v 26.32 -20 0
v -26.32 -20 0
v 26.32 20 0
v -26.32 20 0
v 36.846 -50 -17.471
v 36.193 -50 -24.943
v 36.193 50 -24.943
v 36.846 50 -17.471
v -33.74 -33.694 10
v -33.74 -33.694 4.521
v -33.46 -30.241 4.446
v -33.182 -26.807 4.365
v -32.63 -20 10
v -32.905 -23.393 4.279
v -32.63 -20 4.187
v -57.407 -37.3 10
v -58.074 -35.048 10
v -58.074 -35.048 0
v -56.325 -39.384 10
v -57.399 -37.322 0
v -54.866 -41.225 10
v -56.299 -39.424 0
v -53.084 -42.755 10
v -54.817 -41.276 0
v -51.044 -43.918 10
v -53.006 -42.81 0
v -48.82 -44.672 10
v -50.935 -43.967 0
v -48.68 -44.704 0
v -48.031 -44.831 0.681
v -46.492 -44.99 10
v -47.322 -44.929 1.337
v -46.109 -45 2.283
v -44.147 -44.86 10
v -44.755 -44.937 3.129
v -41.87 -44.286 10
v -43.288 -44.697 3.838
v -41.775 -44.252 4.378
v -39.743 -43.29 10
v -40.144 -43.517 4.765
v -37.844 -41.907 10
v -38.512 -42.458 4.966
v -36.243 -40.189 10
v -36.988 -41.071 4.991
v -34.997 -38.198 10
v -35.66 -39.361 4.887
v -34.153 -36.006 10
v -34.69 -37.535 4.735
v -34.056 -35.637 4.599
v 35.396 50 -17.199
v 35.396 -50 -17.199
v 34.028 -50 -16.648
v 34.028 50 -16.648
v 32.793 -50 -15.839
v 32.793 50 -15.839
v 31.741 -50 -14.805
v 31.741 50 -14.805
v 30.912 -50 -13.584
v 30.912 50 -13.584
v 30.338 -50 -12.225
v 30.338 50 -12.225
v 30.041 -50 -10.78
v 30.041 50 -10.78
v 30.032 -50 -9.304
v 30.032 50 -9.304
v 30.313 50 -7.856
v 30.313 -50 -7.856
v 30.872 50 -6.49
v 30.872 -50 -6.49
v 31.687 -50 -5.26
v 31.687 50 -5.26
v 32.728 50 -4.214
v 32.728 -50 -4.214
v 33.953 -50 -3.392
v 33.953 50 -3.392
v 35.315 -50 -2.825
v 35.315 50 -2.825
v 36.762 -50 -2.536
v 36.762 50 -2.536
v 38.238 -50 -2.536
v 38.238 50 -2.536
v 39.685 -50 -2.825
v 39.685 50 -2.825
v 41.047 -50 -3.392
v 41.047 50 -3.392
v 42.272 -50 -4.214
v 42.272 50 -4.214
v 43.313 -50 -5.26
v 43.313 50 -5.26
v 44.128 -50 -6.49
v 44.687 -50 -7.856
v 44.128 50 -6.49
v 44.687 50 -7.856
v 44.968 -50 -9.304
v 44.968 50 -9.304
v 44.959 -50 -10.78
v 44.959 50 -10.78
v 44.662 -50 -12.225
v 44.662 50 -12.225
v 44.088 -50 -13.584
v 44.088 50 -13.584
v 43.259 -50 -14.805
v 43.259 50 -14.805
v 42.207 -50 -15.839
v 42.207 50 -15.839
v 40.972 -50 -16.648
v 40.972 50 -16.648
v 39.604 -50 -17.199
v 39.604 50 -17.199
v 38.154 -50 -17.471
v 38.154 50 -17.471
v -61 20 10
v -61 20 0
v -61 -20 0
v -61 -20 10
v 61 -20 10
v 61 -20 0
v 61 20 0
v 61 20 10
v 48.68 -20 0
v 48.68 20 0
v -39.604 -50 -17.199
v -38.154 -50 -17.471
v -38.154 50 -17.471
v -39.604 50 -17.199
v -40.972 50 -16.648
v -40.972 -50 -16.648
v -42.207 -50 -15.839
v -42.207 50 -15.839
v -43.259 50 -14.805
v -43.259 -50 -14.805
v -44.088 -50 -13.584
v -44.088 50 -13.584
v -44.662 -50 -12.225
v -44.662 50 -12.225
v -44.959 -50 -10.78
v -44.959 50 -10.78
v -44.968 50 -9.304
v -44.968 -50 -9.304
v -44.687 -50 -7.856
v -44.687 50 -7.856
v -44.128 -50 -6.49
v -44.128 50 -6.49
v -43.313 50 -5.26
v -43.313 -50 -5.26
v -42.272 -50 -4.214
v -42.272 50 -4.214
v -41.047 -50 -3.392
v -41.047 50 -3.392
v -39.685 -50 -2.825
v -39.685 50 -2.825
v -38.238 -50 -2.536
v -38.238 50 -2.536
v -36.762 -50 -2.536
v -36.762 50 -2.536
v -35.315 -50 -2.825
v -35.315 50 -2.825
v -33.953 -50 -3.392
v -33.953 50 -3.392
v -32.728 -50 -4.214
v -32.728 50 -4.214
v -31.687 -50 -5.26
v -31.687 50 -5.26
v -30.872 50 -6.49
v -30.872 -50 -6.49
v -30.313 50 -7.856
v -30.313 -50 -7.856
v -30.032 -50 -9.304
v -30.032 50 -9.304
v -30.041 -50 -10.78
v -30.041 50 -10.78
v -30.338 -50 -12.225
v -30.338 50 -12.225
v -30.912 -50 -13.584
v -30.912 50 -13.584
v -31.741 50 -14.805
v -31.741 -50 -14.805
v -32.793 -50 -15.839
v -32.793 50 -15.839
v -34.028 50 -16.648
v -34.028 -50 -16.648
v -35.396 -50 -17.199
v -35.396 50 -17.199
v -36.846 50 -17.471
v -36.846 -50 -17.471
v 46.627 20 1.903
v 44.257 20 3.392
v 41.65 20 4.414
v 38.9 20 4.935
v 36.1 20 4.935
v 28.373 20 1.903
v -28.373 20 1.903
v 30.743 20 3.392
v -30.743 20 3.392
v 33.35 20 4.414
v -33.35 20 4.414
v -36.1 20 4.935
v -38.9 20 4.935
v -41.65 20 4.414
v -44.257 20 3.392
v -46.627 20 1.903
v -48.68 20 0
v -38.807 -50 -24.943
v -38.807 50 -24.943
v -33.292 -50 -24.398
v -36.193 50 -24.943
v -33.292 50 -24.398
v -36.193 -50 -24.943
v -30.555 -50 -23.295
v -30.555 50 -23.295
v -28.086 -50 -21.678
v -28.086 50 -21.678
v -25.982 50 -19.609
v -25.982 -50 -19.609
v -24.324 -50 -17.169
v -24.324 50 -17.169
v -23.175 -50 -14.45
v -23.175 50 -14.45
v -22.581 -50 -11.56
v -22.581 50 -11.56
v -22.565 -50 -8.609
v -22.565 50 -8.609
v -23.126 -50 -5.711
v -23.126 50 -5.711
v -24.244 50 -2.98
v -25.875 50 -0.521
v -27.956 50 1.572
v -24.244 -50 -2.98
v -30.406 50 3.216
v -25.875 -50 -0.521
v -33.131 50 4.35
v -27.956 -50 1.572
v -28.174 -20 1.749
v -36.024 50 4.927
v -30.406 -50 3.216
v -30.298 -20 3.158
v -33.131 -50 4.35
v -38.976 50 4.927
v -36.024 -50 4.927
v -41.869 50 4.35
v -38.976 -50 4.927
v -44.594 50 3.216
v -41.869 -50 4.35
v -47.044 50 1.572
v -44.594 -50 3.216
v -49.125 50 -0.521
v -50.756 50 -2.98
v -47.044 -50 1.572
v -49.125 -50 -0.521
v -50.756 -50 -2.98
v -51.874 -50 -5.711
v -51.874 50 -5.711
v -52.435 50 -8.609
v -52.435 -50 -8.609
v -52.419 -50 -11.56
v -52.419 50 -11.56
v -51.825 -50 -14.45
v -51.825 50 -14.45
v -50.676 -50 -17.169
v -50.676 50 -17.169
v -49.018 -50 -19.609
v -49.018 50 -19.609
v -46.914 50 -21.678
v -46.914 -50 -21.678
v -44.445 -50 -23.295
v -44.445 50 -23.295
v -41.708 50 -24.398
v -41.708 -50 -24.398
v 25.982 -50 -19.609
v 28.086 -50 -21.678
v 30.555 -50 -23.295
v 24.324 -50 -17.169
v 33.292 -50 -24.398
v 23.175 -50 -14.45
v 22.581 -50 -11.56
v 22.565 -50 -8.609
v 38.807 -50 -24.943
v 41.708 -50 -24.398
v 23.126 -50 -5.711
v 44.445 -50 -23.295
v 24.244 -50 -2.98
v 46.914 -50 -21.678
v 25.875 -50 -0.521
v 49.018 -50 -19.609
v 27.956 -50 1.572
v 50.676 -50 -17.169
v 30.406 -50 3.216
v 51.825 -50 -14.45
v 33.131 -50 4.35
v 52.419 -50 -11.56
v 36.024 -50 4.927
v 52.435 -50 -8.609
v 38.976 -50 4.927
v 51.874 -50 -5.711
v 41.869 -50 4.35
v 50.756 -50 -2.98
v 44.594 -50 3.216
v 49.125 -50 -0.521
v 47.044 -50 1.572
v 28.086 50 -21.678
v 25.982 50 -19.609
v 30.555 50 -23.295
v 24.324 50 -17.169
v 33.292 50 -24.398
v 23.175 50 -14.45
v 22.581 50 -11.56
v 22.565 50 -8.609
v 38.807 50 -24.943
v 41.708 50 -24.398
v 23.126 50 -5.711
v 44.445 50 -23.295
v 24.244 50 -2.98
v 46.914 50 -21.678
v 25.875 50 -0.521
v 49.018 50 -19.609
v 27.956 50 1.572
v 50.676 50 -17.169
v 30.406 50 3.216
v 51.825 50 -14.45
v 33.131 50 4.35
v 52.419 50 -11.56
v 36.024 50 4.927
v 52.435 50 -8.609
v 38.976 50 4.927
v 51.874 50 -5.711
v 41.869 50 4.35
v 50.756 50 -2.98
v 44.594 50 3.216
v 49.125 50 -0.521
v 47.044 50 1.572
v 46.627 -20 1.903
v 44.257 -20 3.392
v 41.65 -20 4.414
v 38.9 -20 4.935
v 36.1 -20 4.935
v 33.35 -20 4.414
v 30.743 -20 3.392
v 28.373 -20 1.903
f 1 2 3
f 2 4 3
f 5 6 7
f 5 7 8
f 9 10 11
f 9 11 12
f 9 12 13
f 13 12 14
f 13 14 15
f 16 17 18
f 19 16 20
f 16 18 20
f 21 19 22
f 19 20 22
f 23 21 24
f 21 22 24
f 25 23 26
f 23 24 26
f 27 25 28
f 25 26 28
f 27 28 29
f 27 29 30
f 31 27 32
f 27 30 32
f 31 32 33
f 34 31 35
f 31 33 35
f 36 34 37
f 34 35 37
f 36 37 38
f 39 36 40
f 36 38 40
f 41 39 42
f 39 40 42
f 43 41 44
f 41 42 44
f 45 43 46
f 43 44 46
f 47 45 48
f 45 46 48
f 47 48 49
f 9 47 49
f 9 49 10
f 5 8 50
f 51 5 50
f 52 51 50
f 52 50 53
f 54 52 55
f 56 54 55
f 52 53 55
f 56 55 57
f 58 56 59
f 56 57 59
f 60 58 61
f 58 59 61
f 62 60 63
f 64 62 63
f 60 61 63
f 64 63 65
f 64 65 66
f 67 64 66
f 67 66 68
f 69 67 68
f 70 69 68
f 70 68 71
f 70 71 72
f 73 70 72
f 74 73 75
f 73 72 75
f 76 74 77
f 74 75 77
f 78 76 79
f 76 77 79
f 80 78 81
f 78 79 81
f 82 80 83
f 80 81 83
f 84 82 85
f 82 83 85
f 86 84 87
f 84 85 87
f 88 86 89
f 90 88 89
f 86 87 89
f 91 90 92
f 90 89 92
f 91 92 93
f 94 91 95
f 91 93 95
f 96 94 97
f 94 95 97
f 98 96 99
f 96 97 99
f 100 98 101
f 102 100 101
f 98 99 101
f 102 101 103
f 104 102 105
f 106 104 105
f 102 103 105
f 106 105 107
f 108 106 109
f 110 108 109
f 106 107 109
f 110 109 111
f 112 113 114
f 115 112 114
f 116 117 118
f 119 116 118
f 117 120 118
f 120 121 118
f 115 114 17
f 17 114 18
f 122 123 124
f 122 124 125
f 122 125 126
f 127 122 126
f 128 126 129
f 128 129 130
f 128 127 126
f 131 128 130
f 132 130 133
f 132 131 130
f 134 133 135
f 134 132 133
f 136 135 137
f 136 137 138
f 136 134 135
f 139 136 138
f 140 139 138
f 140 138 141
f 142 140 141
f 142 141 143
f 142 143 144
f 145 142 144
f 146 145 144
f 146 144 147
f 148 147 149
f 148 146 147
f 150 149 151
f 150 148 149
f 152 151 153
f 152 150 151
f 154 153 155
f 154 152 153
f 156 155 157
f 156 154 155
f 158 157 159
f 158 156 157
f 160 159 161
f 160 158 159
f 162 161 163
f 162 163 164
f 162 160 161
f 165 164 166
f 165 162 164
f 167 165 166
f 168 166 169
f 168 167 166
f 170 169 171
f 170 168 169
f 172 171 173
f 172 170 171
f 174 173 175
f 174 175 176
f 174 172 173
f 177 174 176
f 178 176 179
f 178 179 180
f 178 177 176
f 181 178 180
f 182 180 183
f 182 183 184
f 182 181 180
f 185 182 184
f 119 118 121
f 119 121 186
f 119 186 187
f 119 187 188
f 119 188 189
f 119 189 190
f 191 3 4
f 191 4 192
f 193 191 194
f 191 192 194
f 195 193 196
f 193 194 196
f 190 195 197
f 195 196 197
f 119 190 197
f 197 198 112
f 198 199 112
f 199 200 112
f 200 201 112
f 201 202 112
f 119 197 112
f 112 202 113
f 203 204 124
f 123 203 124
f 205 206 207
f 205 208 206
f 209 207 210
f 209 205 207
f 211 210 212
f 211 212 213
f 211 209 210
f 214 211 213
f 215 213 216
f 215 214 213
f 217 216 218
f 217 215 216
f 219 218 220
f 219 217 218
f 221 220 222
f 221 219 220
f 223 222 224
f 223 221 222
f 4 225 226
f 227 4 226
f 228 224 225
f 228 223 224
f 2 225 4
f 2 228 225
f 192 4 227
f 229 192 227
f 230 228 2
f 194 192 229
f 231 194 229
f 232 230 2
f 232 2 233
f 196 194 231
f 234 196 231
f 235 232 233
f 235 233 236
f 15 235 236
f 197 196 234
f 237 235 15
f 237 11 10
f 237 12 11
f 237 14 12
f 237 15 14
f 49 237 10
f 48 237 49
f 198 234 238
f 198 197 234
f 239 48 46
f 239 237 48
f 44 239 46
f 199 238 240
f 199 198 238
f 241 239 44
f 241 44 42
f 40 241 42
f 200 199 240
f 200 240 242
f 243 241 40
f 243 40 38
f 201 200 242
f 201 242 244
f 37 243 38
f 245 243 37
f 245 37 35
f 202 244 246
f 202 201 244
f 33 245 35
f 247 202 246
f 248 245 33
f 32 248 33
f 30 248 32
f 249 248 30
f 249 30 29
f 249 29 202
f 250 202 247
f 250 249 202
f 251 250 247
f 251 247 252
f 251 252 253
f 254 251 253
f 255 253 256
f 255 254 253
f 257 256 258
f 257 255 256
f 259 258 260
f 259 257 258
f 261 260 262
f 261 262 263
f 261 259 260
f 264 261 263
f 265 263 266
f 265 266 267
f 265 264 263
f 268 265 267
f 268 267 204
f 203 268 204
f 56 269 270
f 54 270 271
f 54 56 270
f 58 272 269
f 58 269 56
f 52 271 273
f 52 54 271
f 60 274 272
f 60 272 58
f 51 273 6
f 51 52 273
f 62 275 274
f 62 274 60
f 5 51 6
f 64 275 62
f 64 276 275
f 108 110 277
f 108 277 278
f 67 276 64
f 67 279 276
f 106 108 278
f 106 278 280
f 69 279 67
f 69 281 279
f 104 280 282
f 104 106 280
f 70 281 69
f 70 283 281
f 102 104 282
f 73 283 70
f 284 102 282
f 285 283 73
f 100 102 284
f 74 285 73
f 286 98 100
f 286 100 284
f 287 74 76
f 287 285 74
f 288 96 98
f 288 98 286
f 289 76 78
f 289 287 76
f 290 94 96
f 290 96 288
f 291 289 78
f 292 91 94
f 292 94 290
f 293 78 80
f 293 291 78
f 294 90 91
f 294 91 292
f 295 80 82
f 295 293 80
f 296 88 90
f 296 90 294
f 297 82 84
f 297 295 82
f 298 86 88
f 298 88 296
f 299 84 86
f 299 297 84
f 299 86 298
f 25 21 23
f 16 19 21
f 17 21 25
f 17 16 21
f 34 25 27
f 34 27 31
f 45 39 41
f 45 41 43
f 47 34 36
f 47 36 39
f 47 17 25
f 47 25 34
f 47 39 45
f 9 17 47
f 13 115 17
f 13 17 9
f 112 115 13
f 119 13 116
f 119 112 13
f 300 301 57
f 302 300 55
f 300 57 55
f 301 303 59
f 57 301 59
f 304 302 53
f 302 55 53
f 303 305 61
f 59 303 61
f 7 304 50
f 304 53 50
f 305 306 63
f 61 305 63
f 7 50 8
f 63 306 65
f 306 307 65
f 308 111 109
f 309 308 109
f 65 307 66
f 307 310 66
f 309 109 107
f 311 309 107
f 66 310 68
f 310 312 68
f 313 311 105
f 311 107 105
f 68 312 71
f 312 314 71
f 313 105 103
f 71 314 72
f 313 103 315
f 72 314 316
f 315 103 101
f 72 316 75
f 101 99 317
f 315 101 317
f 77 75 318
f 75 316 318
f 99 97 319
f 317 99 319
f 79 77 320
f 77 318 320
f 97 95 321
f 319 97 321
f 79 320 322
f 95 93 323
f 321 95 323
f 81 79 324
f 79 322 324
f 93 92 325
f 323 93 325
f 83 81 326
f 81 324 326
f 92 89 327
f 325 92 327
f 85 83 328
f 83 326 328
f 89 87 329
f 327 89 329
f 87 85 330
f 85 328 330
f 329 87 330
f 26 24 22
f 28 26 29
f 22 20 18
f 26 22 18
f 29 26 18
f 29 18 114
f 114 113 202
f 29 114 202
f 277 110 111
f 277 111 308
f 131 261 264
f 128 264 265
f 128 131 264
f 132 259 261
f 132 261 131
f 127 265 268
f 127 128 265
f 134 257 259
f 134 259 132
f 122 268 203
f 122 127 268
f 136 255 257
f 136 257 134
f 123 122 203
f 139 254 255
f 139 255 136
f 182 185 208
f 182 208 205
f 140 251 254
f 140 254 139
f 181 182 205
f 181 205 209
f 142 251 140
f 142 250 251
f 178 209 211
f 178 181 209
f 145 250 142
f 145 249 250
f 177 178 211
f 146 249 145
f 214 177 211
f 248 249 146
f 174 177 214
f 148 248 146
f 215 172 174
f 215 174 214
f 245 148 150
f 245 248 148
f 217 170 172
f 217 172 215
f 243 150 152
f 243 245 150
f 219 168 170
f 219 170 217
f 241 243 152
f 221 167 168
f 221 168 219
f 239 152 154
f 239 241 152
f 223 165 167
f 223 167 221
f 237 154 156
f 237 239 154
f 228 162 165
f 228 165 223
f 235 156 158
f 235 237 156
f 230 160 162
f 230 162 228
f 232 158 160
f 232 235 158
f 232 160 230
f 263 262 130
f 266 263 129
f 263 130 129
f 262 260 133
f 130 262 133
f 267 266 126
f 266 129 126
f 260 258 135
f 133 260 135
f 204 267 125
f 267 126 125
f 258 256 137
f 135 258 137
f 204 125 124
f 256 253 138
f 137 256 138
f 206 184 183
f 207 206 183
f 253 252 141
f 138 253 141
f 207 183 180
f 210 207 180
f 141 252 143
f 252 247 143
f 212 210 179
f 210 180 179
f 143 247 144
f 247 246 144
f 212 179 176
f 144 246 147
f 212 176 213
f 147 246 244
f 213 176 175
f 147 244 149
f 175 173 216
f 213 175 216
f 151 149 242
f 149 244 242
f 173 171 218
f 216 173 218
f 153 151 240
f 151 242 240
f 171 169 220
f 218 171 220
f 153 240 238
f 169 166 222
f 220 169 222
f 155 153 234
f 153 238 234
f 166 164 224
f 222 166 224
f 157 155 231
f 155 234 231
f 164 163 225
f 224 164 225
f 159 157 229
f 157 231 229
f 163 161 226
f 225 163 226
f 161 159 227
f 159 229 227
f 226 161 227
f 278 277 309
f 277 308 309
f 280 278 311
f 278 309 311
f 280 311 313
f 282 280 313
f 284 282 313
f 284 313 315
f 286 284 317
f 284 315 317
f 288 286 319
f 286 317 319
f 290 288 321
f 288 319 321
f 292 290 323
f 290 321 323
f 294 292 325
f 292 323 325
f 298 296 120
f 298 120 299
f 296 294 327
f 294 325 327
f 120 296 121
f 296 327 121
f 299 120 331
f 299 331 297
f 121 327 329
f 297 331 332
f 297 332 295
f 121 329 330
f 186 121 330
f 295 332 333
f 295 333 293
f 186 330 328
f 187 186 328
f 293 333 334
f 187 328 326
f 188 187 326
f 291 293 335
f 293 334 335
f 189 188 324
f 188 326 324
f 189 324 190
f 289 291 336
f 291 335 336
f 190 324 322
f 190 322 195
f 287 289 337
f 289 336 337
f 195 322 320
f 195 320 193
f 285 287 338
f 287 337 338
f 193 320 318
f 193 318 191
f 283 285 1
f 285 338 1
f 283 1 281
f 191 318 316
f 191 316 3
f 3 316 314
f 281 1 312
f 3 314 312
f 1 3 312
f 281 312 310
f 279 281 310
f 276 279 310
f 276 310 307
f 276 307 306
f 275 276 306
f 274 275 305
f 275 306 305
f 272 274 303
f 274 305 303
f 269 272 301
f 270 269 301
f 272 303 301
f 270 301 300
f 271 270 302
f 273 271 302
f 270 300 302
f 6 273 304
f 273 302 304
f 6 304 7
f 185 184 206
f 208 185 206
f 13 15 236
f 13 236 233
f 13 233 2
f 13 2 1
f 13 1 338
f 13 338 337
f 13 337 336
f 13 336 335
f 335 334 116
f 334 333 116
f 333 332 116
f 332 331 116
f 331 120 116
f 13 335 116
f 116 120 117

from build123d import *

# Parameters (mm, degrees)
F1_DEPTH = 10
F3_DEPTH = 50


with BuildPart() as f1:
    # F0 (on Top) → F1 (new body)
    with BuildSketch(Plane.XY):
        Polygon((-32.629684, -20), (61, -20), (61, 20), (-61, 20), (-61, -20), align=None)
        with BuildLine():
            Line((-33.740249, -33.694233), (-32.629684, -20))
            Line((-32.629684, -20), (-61, -20))
            Line((-61, -20), (-58.073841, -35.047843))
            ThreePointArc((-58.073841, -35.047843), (-45.316841, -44.981014), (-33.740249, -33.694233))
        make_face()
    extrude(amount=F1_DEPTH)

    # F2 (on Front) → F3 (join, symmetric)
    with BuildSketch(Plane.XZ):
        with BuildLine():
            ThreePointArc((36.846332, -17.47146), (37.5, -2.5), (38.153668, -17.47146))
            Line((38.153668, -17.47146), (38.807336, -24.94292))
            ThreePointArc((38.807336, -24.94292), (37.5, 5), (36.192664, -24.94292))
            Line((36.192664, -24.94292), (36.846332, -17.47146))
        make_face()
        with BuildLine():
            Line((-38.807336, -24.94292), (-38.153668, -17.47146))
            ThreePointArc((-38.153668, -17.47146), (-37.5, -2.5), (-36.846332, -17.47146))
            Line((-36.846332, -17.47146), (-36.192664, -24.94292))
            ThreePointArc((-36.192664, -24.94292), (-37.5, 5), (-38.807336, -24.94292))
        make_face()
    extrude(amount=F3_DEPTH, both=True)


solid = f1.part
